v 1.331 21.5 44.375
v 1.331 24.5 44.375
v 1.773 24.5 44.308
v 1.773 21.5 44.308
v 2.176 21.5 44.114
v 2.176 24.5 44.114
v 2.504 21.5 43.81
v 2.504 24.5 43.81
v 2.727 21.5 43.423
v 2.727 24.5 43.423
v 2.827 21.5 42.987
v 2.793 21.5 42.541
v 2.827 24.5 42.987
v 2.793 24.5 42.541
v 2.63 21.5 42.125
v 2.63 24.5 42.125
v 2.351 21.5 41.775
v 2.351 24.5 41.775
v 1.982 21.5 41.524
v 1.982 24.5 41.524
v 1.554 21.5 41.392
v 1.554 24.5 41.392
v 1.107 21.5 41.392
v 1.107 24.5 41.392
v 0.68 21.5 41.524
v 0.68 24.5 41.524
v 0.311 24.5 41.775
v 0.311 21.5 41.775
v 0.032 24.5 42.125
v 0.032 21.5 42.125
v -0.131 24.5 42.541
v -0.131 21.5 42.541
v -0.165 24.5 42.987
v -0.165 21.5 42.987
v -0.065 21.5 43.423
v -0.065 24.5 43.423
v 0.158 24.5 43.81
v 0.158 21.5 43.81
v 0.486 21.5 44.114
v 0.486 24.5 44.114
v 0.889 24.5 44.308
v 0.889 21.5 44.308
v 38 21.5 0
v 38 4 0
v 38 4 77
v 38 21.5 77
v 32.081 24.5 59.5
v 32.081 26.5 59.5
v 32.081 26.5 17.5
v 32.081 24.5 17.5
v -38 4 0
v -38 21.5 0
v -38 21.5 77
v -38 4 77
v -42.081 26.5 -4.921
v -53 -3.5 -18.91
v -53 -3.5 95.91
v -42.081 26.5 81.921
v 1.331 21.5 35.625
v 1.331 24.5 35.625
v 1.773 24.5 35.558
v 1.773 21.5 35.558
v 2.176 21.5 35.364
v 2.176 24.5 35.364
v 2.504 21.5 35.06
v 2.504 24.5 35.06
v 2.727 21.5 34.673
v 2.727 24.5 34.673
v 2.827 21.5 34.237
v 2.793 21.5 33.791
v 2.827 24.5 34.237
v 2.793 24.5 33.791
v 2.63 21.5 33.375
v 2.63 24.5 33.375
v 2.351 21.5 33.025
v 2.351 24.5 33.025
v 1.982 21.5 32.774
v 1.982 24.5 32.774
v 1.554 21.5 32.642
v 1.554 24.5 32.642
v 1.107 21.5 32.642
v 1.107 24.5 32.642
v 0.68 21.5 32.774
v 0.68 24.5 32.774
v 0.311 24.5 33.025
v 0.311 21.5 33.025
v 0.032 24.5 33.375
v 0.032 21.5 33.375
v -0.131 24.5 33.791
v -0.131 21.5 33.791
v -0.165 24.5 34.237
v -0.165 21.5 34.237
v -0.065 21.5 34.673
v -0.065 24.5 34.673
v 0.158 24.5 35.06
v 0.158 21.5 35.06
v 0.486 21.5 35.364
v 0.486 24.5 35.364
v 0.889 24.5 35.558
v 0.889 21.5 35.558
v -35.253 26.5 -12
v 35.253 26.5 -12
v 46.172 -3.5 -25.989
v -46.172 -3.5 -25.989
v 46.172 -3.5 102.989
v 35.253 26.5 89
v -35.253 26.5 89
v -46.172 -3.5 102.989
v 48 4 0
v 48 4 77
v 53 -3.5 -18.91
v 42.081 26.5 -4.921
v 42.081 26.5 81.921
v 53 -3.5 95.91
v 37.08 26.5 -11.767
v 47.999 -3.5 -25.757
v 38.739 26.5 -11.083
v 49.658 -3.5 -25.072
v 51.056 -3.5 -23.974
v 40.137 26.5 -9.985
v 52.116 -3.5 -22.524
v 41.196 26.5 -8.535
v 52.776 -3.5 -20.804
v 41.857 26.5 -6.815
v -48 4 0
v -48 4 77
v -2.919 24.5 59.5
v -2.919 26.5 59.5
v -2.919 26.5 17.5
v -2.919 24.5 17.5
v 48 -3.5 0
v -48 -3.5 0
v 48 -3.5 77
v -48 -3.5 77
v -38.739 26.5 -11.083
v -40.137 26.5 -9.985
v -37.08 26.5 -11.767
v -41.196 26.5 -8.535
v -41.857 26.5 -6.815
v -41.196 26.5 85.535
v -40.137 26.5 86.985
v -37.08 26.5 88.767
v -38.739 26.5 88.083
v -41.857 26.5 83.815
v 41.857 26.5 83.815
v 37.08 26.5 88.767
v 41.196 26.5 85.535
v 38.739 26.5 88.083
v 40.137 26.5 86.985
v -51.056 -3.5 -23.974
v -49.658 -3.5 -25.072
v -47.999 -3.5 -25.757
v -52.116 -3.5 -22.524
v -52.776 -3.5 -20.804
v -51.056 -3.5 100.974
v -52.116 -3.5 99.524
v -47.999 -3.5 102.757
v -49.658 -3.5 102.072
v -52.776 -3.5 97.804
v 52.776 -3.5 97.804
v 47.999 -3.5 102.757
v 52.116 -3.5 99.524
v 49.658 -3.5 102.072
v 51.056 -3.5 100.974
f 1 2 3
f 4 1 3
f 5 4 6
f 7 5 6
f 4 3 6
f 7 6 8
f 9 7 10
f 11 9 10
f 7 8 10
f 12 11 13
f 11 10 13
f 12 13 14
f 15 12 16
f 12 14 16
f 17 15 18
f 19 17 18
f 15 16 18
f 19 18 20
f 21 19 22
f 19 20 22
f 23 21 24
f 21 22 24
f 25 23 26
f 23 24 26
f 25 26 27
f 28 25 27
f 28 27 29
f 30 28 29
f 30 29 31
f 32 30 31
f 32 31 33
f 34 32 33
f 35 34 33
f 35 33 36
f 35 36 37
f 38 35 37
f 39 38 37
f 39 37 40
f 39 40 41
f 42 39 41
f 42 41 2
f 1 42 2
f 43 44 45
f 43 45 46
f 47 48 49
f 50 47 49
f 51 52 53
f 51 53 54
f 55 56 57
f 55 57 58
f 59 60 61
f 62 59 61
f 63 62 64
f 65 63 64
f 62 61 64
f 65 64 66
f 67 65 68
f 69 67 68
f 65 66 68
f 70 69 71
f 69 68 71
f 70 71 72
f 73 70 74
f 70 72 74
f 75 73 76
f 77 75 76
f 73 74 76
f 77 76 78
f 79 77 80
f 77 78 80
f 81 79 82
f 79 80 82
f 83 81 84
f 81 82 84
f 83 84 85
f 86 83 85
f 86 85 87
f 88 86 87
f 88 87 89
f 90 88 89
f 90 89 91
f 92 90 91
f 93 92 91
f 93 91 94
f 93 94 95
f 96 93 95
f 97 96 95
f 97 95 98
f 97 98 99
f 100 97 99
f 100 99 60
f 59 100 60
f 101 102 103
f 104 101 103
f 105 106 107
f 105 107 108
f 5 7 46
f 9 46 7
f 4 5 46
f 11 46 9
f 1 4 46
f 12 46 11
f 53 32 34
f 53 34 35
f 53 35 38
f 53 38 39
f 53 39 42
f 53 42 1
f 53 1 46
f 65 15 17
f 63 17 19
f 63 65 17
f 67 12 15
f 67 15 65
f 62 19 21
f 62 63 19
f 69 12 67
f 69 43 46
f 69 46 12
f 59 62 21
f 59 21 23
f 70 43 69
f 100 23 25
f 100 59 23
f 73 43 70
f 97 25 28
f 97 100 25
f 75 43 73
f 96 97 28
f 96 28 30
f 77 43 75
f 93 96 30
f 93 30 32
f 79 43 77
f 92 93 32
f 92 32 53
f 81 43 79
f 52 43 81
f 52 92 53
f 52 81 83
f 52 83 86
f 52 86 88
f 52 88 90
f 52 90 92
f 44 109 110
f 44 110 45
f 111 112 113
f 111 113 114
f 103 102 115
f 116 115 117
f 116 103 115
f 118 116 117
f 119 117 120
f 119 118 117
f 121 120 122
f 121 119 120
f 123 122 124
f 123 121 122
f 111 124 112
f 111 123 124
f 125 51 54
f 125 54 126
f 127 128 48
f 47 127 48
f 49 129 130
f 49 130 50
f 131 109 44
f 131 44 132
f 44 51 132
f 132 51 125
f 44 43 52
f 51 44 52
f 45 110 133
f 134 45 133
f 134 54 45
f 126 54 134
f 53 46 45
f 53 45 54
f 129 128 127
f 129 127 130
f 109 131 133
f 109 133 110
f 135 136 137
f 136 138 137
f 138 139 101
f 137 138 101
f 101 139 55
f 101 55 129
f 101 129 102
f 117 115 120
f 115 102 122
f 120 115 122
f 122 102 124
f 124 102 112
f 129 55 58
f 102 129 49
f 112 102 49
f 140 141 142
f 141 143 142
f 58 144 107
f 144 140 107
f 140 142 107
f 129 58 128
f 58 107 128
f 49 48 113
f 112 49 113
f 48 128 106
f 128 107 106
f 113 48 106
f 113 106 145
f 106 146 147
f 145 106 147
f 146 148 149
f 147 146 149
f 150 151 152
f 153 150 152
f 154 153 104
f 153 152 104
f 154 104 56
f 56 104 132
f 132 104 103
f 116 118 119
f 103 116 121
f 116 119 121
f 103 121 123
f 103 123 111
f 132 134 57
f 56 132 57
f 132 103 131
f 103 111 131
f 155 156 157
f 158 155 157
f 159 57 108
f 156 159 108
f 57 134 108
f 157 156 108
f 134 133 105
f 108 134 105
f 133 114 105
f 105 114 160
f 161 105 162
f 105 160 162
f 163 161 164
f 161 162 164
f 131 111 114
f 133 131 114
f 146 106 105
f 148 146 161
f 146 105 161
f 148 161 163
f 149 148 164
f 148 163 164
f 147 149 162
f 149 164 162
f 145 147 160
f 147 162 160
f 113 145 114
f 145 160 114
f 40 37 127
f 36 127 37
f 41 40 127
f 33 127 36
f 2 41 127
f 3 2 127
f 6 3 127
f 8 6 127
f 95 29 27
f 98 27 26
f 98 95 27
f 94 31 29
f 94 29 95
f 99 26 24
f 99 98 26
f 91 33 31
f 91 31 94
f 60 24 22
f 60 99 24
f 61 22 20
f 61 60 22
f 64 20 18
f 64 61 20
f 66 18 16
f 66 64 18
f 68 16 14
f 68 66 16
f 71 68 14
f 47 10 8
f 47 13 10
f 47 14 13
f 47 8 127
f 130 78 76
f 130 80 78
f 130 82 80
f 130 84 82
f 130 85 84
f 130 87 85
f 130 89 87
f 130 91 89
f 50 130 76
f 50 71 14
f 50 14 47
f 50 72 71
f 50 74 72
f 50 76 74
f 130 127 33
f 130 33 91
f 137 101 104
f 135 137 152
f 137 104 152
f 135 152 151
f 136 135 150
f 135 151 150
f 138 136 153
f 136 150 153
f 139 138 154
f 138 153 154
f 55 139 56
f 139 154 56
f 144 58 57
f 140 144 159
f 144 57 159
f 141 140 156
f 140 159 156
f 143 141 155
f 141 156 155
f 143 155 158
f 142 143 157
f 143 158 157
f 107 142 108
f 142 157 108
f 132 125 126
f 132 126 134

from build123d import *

# Parameters (mm, degrees)
TOP_ENCLOSURE_DEPTH    = 77
TOP_EXTRA_DEPTH        = 12
SKETCH3_W              = 35
SKETCH3_H              = 42
SOLAR_CELL_SLOT_DEPTH  = 2
SKETCH4_R              = 1.5
SOLAR_CELL_HOLES_DEPTH = 108.30330843
BOSS_EXTRUDE1_REACH    = 108.922
BOSS_EXTRUDE2_REACH    = 120.819
FILLET1_R              = 7.5


with BuildPart() as part:
    # Master_Geometry → Top_Enclosure (new body)
    with BuildSketch(Plane.XY):
        Polygon((-48, -3.5), (-53, -3.5), (-42.080892972, 26.5), (42.080892972, 26.5), (53, -3.5), (48, -3.5), (48, 4), (38, 4), (38, 21.5), (-38, 21.5), (-38, 4), (-48, 4), align=None)
    extrude(amount=TOP_ENCLOSURE_DEPTH)

    # Sketch2 → Top_Extra (add)
    with BuildSketch(Plane.XY.offset(77)):
        Polygon((-42.080892972, 26.5), (42.080892972, 26.5), (53, -3.5), (-53, -3.5), align=None)
    top_extra = extrude(amount=TOP_EXTRA_DEPTH)

    # Mirror1: Top_Extra across plane
    add(top_extra.mirror(Plane(origin=(0, 0, 38.5), x_dir=(1, 0, 0), z_dir=(0, 0, -1))))

    # Sketch3 → Solar_Cell_Slot (cut)
    with BuildSketch(Plane(origin=(0, 26.5, 0), x_dir=(1, 0, 0), z_dir=(0, 1, 0))):
        with Locations((14.580892972, -38.5)):
            Rectangle(SKETCH3_W, SKETCH3_H)
    extrude(amount=-SOLAR_CELL_SLOT_DEPTH, mode=Mode.SUBTRACT)

    # Sketch4 → Solar_Cell_Holes (cut, through all)
    with BuildSketch(Plane(origin=(0, 24.5, 0), x_dir=(1, 0, 0), z_dir=(0, 1, 0))):
        with Locations(Location((1.330892972, -34.125, 0), (0, 0, 270))):
            Circle(SKETCH4_R)
        with Locations(Location((1.330892972, -42.875, 0), (0, 0, 270))):
            Circle(SKETCH4_R)
    extrude(amount=-SOLAR_CELL_HOLES_DEPTH, mode=Mode.SUBTRACT)

    # Boss-Extrude1: up to this plane
    boss_extrude1_end = Plane(origin=(42.080892972, 26.5, 77), z_dir=(-0.9396926207859069, -0.3420201433256729, 0))
    # Sketch5 → Boss-Extrude1 (add, up to the surface)
    with BuildSketch(Plane(origin=(0, 0, 0), x_dir=(0, 0, -1), z_dir=(1, 0, 0)), mode=Mode.PRIVATE) as boss_extrude1_sk1:
        Polygon((-89, 26.5), (-89, -3.5), (-102.989229745, -3.5), align=None)
    boss_extrude1_tool1 = split(extrude(boss_extrude1_sk1.sketch, amount=BOSS_EXTRUDE1_REACH, mode=Mode.PRIVATE), bisect_by=boss_extrude1_end, keep=Keep.BOTH, mode=Mode.PRIVATE)
    boss_extrude1 = boss_extrude1_tool1.solids().sort_by_distance((0, 6.5, 93.663077))[0]
    add(boss_extrude1)

    # Boss-Extrude2: up to this face of the body (flat: up to its plane)
    boss_extrude2_end = Plane(part.part.faces().sort_by_distance((-47.540446486, 11.5, 38.5))[0])
    # Sketch6 → Boss-Extrude2 (add, up to the picked face)
    with BuildSketch(Plane.ZY, mode=Mode.PRIVATE) as boss_extrude2_sk1:
        Polygon((89, 26.5), (102.989229745, -3.5), (89, -3.5), align=None)
    boss_extrude2_tool1 = split(extrude(boss_extrude2_sk1.sketch, amount=BOSS_EXTRUDE2_REACH, mode=Mode.PRIVATE), bisect_by=boss_extrude2_end, keep=Keep.BOTH, mode=Mode.PRIVATE)
    boss_extrude2 = boss_extrude2_tool1.solids().sort_by(Axis((0, 6.5, 93.663077), (-1, 0, 0)))[0]
    add(boss_extrude2)

    # Mirror3: Boss-Extrude1, Boss-Extrude2 across plane
    add(boss_extrude1.mirror(Plane(origin=(0, 0, 38.5), x_dir=(1, 0, 0), z_dir=(0, 0, -1))))
    add(boss_extrude2.mirror(Plane(origin=(0, 0, 38.5), x_dir=(1, 0, 0), z_dir=(0, 0, -1))))

    # Fillet1
    fillet1_edges = [part.edges().sort_by_distance(p)[0] for p in [
        (-47.540446486, 11.5, 95.994614872),
        (47.540446486, 11.5, -18.994614872),
        (-47.540446486, 11.5, -18.994614872),
        (47.540446486, 11.5, 95.994614872),
    ]]
    fillet(fillet1_edges, radius=FILLET1_R)


solid = part.part
